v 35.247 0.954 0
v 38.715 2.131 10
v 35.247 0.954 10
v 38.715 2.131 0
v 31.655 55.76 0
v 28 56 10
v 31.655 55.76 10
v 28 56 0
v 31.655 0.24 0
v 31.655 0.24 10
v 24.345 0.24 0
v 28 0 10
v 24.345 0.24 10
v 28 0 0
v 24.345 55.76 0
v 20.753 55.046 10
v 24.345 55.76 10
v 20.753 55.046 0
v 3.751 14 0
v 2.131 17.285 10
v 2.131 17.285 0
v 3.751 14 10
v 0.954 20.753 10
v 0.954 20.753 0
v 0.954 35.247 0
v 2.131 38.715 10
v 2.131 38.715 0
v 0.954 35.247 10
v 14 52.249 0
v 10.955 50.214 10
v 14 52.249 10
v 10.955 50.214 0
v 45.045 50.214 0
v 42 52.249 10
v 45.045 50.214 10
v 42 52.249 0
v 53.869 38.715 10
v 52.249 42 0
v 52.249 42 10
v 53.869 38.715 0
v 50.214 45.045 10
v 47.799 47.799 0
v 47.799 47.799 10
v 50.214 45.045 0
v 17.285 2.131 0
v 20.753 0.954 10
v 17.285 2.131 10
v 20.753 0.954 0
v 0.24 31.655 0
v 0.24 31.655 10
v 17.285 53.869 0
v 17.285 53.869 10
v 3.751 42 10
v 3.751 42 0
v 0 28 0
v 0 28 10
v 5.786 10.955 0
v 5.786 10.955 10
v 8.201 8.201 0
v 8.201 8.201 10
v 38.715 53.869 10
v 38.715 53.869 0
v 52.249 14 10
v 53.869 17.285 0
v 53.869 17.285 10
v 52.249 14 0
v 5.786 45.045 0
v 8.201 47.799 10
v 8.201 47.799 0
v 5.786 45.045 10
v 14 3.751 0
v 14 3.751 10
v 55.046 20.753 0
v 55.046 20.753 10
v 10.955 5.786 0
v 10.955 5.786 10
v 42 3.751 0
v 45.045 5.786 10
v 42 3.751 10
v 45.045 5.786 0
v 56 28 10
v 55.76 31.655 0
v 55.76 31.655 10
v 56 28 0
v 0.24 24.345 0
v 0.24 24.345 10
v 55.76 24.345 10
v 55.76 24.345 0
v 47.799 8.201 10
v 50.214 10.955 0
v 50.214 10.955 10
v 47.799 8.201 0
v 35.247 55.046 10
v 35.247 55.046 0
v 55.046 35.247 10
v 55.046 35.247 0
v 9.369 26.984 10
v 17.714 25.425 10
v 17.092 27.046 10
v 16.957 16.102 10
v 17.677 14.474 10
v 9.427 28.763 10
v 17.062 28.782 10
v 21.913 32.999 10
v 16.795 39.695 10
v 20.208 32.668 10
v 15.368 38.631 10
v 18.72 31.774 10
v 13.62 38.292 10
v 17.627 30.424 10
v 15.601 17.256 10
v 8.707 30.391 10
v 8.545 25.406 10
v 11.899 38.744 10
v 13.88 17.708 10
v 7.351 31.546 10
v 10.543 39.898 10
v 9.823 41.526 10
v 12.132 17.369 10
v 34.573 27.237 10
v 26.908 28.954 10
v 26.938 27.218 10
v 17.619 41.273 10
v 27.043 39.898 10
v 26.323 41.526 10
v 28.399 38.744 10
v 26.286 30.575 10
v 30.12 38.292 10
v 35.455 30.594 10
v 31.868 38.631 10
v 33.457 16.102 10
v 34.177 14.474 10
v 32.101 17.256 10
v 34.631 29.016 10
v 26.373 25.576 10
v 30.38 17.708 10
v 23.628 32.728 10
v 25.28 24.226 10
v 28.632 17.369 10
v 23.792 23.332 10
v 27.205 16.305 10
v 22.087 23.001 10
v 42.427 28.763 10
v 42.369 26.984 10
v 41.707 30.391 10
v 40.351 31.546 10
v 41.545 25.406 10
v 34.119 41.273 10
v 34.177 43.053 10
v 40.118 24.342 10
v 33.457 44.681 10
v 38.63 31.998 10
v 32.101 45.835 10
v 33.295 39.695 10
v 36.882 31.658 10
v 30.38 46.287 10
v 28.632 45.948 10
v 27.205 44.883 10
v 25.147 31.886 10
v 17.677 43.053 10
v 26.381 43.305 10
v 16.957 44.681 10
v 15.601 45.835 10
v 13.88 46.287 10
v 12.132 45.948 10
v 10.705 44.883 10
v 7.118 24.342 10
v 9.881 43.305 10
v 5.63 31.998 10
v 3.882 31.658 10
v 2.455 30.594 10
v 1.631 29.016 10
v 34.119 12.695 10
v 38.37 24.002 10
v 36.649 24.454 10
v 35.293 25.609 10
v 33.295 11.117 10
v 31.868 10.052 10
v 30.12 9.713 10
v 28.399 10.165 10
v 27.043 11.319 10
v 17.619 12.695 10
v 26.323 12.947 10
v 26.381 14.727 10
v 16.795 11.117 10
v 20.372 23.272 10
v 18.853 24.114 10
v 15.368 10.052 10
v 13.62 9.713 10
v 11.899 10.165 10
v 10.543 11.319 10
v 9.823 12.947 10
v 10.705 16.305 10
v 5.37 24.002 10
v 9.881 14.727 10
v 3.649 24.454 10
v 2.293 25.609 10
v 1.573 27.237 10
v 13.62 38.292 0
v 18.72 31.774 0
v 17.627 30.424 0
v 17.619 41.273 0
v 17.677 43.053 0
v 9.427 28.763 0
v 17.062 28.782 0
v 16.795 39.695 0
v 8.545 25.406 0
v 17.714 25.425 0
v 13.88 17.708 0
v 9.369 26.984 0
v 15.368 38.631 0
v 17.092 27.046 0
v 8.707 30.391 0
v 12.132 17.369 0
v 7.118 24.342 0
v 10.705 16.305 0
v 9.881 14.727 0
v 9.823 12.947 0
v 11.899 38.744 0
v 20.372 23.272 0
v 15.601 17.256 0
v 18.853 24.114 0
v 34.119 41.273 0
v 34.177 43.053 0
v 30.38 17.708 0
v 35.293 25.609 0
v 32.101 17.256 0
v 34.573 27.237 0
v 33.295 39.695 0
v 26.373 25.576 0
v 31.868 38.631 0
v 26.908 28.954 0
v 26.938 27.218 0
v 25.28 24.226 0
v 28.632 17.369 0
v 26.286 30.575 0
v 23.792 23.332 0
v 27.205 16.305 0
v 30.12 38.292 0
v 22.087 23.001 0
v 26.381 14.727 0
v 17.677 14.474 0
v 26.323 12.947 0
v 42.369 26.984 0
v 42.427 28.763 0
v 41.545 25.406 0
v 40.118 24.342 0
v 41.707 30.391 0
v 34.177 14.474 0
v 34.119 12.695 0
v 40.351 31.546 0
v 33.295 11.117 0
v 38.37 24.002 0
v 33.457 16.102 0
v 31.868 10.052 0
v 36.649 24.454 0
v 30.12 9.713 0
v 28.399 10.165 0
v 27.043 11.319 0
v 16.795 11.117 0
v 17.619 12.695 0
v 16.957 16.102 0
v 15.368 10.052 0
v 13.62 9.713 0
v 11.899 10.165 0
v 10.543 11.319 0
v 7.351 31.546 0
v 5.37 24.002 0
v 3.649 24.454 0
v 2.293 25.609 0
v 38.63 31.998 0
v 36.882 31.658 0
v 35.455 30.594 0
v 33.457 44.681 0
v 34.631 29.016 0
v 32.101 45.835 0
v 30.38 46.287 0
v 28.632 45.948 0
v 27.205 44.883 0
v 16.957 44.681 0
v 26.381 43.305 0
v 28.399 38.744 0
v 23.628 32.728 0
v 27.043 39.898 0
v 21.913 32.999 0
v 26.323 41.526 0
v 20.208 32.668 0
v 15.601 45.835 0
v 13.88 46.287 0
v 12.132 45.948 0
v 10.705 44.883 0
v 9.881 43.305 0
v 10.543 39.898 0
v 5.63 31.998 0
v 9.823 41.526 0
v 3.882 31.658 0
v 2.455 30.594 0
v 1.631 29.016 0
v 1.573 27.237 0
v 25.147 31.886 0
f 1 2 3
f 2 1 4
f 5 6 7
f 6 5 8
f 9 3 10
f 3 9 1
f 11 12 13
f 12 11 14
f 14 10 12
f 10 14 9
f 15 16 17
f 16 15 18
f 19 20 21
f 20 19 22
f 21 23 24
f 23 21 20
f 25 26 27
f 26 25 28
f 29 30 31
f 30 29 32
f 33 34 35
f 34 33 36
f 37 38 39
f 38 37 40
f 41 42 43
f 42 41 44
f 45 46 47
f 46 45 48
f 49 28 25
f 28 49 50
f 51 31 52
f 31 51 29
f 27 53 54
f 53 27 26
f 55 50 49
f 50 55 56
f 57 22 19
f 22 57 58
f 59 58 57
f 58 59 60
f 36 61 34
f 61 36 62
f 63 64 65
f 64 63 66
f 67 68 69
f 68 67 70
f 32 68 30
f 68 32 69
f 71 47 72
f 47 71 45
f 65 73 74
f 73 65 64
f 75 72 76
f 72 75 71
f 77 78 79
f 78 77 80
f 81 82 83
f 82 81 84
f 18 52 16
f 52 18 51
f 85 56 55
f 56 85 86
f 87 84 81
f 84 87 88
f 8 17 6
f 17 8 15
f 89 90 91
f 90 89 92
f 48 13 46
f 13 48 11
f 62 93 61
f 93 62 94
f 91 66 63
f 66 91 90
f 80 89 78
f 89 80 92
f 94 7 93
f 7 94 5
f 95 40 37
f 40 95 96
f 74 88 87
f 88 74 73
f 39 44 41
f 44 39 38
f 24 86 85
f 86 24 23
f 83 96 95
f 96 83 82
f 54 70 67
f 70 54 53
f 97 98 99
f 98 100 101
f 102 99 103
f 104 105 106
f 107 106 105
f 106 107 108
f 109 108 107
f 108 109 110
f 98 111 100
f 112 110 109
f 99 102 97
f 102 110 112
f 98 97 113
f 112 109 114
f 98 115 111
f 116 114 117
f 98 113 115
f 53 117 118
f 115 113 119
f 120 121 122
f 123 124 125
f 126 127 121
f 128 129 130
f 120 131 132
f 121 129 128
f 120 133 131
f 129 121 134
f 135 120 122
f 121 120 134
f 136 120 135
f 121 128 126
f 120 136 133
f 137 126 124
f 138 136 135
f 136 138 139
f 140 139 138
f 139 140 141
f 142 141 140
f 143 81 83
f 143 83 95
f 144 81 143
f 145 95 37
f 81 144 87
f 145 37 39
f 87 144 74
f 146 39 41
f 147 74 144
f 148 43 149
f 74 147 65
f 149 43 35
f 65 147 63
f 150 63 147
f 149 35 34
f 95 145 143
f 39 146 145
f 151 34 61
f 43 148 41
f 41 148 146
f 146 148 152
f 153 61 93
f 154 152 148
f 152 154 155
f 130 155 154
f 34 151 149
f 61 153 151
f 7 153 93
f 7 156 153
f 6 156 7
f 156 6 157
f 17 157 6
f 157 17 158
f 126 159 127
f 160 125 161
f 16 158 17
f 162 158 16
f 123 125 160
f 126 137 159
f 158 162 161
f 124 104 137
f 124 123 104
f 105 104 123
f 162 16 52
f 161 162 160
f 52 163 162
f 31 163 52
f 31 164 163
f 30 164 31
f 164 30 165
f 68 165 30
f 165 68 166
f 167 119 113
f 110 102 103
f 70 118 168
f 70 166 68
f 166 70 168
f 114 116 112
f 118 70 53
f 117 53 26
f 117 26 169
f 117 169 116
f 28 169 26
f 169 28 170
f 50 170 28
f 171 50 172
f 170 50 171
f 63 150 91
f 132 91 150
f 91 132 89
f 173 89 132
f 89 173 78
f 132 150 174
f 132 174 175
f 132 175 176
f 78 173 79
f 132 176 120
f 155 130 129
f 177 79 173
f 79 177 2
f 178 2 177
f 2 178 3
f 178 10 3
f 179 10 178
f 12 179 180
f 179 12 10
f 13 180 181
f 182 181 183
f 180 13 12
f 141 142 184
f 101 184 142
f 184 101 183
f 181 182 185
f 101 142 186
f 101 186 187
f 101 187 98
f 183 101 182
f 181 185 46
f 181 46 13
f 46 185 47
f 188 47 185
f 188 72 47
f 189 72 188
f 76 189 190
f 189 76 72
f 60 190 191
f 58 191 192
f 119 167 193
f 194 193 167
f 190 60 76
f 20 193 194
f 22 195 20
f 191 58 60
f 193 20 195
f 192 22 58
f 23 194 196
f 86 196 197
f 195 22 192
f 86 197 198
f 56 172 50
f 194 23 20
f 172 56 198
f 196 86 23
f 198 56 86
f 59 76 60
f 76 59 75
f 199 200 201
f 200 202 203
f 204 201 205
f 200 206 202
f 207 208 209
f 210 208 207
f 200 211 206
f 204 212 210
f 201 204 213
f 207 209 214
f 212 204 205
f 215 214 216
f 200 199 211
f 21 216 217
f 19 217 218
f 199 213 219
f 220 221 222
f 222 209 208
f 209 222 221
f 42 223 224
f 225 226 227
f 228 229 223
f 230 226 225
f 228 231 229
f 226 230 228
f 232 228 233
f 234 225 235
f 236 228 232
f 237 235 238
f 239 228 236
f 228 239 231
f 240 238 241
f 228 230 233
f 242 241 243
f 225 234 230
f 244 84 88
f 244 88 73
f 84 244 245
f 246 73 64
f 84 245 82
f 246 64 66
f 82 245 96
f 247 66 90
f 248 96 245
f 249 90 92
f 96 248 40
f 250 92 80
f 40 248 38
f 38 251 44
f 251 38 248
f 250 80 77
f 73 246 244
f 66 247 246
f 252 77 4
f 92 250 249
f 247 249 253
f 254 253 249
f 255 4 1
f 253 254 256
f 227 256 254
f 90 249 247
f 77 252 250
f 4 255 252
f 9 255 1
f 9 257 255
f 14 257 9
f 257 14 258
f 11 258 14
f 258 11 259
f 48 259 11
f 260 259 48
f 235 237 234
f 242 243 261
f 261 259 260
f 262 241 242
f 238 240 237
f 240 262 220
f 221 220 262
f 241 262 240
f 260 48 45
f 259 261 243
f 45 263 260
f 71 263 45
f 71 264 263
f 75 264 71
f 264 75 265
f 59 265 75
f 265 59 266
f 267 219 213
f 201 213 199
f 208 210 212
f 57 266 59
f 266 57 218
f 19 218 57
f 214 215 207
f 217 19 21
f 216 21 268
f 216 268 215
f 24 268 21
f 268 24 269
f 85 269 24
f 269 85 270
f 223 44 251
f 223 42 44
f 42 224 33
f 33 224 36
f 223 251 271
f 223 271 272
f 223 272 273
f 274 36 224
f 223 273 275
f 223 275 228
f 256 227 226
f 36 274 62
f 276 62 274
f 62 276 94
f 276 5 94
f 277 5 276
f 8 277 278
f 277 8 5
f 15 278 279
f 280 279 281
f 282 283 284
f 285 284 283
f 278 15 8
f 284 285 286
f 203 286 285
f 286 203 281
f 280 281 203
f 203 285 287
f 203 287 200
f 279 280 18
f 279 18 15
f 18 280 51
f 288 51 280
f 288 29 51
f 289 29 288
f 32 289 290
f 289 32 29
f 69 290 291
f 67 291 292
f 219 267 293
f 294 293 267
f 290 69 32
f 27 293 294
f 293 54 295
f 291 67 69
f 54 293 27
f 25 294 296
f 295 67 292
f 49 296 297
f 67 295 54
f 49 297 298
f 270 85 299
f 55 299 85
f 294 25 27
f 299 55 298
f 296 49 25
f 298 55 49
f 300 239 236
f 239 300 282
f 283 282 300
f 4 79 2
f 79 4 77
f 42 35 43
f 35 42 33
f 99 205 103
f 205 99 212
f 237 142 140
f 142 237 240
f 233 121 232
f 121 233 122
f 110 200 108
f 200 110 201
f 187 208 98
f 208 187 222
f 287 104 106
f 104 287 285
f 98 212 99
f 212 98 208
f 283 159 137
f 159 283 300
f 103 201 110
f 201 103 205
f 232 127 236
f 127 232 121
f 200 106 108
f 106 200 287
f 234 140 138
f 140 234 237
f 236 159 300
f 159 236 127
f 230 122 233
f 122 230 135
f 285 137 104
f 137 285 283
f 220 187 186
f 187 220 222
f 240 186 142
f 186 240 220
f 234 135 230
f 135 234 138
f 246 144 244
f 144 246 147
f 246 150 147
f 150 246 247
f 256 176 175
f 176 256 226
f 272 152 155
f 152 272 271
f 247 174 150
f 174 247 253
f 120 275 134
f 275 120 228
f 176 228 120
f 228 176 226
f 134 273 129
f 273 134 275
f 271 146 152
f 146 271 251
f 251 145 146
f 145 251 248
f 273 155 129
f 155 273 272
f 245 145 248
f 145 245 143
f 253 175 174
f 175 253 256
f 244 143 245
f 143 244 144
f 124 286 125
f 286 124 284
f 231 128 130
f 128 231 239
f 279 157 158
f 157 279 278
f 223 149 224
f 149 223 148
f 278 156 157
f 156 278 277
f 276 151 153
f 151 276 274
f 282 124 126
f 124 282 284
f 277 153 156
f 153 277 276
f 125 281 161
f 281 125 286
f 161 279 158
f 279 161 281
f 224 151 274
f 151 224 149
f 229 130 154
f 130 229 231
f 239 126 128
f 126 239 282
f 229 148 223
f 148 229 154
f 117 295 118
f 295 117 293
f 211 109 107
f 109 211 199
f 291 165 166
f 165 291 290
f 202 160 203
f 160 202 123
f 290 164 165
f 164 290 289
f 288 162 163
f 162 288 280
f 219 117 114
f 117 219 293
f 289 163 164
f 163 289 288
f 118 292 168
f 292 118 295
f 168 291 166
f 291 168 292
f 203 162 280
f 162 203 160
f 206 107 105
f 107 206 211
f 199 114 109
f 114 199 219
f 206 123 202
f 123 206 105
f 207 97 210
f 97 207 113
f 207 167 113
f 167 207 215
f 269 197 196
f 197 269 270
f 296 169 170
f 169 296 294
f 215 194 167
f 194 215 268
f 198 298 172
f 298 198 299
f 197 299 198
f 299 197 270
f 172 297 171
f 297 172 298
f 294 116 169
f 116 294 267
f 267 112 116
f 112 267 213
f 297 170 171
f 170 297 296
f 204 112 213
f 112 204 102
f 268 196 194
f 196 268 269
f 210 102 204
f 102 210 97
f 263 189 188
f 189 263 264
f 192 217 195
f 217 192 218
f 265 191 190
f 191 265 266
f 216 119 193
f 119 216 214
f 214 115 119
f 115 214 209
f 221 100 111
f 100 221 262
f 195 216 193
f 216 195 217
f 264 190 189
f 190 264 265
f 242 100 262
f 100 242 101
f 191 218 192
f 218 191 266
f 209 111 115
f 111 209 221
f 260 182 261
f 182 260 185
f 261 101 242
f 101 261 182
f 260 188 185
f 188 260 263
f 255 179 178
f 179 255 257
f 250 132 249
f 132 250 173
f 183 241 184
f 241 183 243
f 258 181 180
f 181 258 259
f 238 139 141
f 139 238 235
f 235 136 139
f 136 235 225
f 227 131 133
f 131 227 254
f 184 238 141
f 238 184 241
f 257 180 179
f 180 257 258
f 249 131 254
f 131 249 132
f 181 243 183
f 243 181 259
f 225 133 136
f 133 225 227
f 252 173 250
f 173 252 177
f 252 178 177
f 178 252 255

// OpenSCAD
$fn = 32;

// ----------------------------------------------------------------------
// Cam plate: eccentric cam, base R28
// ----------------------------------------------------------------------

// --- parameters (mm) ---
base_r = 28;              // base circle radius
lobe_h = 10;              // cam lobe rise
bore_r = 5;               // shaft bore radius
plate_t = 10;             // plate thickness, Z (extrusion height)
ecc = 6;                  // disc eccentricity
ring_r = 16.5;            // lightening ring radius
bolt_r = 4;               // lightening hole radius

profile = [[56, 28], [55.76, 31.655], [55.046, 35.247], [53.869, 38.715], [52.249, 42], [50.214, 45.045], [47.799, 47.799], [45.045, 50.214], [42, 52.249], [38.715, 53.869], [35.247, 55.046], [31.655, 55.76], [28, 56], [24.345, 55.76], [20.753, 55.046], [17.285, 53.869], [14, 52.249], [10.955, 50.214], [8.201, 47.799], [5.786, 45.045], [3.751, 42], [2.131, 38.715], [0.954, 35.247], [0.24, 31.655], [0, 28], [0.24, 24.345], [0.954, 20.753], [2.131, 17.285], [3.751, 14], [5.786, 10.955], [8.201, 8.201], [10.955, 5.786], [14, 3.751], [17.285, 2.131], [20.753, 0.954], [24.345, 0.24], [28, 0], [31.655, 0.24], [35.247, 0.954], [38.715, 2.131], [42, 3.751], [45.045, 5.786], [47.799, 8.201], [50.214, 10.955], [52.249, 14], [53.869, 17.285], [55.046, 20.753], [55.76, 24.345]];  // primary outline, 48 points, counter clockwise
void_1 = [[26.908, 28.954], [26.286, 30.575], [25.147, 31.886], [23.628, 32.728], [21.913, 32.999], [20.208, 32.668], [18.72, 31.774], [17.627, 30.424], [17.062, 28.782], [17.092, 27.046], [17.714, 25.425], [18.853, 24.114], [20.372, 23.272], [22.087, 23.001], [23.792, 23.332], [25.28, 24.226], [26.373, 25.576], [26.938, 27.218]];  // shaft bore, 18 points
void_2 = [[42.427, 28.763], [41.707, 30.391], [40.351, 31.546], [38.63, 31.998], [36.882, 31.658], [35.455, 30.594], [34.631, 29.016], [34.573, 27.237], [35.293, 25.609], [36.649, 24.454], [38.37, 24.002], [40.118, 24.342], [41.545, 25.406], [42.369, 26.984]];  // lightening hole 1, 14 points
void_3 = [[34.177, 43.053], [33.457, 44.681], [32.101, 45.835], [30.38, 46.287], [28.632, 45.948], [27.205, 44.883], [26.381, 43.305], [26.323, 41.526], [27.043, 39.898], [28.399, 38.744], [30.12, 38.292], [31.868, 38.631], [33.295, 39.695], [34.119, 41.273]];  // lightening hole 2, 14 points
void_4 = [[17.677, 43.053], [16.957, 44.681], [15.601, 45.835], [13.88, 46.287], [12.132, 45.948], [10.705, 44.883], [9.881, 43.305], [9.823, 41.526], [10.543, 39.898], [11.899, 38.744], [13.62, 38.292], [15.368, 38.631], [16.795, 39.695], [17.619, 41.273]];  // lightening hole 3, 14 points
void_5 = [[9.427, 28.763], [8.707, 30.391], [7.351, 31.546], [5.63, 31.998], [3.882, 31.658], [2.455, 30.594], [1.631, 29.016], [1.573, 27.237], [2.293, 25.609], [3.649, 24.454], [5.37, 24.002], [7.118, 24.342], [8.545, 25.406], [9.369, 26.984]];  // lightening hole 4, 14 points
void_6 = [[17.677, 14.474], [16.957, 16.102], [15.601, 17.256], [13.88, 17.708], [12.132, 17.369], [10.705, 16.305], [9.881, 14.727], [9.823, 12.947], [10.543, 11.319], [11.899, 10.165], [13.62, 9.713], [15.368, 10.052], [16.795, 11.117], [17.619, 12.695]];  // lightening hole 5, 14 points
void_7 = [[34.177, 14.474], [33.457, 16.102], [32.101, 17.256], [30.38, 17.708], [28.632, 17.369], [27.205, 16.305], [26.381, 14.727], [26.323, 12.947], [27.043, 11.319], [28.399, 10.165], [30.12, 9.713], [31.868, 10.052], [33.295, 11.117], [34.119, 12.695]];  // lightening hole 6, 14 points

// --- the one profile operation ---
difference() {
  linear_extrude(height = plate_t) polygon(points = profile);
  translate([0, 0, -1])
    linear_extrude(height = plate_t + 2) polygon(points = void_1);
  translate([0, 0, -1])
    linear_extrude(height = plate_t + 2) polygon(points = void_2);
  translate([0, 0, -1])
    linear_extrude(height = plate_t + 2) polygon(points = void_3);
  translate([0, 0, -1])
    linear_extrude(height = plate_t + 2) polygon(points = void_4);
  translate([0, 0, -1])
    linear_extrude(height = plate_t + 2) polygon(points = void_5);
  translate([0, 0, -1])
    linear_extrude(height = plate_t + 2) polygon(points = void_6);
  translate([0, 0, -1])
    linear_extrude(height = plate_t + 2) polygon(points = void_7);
}
